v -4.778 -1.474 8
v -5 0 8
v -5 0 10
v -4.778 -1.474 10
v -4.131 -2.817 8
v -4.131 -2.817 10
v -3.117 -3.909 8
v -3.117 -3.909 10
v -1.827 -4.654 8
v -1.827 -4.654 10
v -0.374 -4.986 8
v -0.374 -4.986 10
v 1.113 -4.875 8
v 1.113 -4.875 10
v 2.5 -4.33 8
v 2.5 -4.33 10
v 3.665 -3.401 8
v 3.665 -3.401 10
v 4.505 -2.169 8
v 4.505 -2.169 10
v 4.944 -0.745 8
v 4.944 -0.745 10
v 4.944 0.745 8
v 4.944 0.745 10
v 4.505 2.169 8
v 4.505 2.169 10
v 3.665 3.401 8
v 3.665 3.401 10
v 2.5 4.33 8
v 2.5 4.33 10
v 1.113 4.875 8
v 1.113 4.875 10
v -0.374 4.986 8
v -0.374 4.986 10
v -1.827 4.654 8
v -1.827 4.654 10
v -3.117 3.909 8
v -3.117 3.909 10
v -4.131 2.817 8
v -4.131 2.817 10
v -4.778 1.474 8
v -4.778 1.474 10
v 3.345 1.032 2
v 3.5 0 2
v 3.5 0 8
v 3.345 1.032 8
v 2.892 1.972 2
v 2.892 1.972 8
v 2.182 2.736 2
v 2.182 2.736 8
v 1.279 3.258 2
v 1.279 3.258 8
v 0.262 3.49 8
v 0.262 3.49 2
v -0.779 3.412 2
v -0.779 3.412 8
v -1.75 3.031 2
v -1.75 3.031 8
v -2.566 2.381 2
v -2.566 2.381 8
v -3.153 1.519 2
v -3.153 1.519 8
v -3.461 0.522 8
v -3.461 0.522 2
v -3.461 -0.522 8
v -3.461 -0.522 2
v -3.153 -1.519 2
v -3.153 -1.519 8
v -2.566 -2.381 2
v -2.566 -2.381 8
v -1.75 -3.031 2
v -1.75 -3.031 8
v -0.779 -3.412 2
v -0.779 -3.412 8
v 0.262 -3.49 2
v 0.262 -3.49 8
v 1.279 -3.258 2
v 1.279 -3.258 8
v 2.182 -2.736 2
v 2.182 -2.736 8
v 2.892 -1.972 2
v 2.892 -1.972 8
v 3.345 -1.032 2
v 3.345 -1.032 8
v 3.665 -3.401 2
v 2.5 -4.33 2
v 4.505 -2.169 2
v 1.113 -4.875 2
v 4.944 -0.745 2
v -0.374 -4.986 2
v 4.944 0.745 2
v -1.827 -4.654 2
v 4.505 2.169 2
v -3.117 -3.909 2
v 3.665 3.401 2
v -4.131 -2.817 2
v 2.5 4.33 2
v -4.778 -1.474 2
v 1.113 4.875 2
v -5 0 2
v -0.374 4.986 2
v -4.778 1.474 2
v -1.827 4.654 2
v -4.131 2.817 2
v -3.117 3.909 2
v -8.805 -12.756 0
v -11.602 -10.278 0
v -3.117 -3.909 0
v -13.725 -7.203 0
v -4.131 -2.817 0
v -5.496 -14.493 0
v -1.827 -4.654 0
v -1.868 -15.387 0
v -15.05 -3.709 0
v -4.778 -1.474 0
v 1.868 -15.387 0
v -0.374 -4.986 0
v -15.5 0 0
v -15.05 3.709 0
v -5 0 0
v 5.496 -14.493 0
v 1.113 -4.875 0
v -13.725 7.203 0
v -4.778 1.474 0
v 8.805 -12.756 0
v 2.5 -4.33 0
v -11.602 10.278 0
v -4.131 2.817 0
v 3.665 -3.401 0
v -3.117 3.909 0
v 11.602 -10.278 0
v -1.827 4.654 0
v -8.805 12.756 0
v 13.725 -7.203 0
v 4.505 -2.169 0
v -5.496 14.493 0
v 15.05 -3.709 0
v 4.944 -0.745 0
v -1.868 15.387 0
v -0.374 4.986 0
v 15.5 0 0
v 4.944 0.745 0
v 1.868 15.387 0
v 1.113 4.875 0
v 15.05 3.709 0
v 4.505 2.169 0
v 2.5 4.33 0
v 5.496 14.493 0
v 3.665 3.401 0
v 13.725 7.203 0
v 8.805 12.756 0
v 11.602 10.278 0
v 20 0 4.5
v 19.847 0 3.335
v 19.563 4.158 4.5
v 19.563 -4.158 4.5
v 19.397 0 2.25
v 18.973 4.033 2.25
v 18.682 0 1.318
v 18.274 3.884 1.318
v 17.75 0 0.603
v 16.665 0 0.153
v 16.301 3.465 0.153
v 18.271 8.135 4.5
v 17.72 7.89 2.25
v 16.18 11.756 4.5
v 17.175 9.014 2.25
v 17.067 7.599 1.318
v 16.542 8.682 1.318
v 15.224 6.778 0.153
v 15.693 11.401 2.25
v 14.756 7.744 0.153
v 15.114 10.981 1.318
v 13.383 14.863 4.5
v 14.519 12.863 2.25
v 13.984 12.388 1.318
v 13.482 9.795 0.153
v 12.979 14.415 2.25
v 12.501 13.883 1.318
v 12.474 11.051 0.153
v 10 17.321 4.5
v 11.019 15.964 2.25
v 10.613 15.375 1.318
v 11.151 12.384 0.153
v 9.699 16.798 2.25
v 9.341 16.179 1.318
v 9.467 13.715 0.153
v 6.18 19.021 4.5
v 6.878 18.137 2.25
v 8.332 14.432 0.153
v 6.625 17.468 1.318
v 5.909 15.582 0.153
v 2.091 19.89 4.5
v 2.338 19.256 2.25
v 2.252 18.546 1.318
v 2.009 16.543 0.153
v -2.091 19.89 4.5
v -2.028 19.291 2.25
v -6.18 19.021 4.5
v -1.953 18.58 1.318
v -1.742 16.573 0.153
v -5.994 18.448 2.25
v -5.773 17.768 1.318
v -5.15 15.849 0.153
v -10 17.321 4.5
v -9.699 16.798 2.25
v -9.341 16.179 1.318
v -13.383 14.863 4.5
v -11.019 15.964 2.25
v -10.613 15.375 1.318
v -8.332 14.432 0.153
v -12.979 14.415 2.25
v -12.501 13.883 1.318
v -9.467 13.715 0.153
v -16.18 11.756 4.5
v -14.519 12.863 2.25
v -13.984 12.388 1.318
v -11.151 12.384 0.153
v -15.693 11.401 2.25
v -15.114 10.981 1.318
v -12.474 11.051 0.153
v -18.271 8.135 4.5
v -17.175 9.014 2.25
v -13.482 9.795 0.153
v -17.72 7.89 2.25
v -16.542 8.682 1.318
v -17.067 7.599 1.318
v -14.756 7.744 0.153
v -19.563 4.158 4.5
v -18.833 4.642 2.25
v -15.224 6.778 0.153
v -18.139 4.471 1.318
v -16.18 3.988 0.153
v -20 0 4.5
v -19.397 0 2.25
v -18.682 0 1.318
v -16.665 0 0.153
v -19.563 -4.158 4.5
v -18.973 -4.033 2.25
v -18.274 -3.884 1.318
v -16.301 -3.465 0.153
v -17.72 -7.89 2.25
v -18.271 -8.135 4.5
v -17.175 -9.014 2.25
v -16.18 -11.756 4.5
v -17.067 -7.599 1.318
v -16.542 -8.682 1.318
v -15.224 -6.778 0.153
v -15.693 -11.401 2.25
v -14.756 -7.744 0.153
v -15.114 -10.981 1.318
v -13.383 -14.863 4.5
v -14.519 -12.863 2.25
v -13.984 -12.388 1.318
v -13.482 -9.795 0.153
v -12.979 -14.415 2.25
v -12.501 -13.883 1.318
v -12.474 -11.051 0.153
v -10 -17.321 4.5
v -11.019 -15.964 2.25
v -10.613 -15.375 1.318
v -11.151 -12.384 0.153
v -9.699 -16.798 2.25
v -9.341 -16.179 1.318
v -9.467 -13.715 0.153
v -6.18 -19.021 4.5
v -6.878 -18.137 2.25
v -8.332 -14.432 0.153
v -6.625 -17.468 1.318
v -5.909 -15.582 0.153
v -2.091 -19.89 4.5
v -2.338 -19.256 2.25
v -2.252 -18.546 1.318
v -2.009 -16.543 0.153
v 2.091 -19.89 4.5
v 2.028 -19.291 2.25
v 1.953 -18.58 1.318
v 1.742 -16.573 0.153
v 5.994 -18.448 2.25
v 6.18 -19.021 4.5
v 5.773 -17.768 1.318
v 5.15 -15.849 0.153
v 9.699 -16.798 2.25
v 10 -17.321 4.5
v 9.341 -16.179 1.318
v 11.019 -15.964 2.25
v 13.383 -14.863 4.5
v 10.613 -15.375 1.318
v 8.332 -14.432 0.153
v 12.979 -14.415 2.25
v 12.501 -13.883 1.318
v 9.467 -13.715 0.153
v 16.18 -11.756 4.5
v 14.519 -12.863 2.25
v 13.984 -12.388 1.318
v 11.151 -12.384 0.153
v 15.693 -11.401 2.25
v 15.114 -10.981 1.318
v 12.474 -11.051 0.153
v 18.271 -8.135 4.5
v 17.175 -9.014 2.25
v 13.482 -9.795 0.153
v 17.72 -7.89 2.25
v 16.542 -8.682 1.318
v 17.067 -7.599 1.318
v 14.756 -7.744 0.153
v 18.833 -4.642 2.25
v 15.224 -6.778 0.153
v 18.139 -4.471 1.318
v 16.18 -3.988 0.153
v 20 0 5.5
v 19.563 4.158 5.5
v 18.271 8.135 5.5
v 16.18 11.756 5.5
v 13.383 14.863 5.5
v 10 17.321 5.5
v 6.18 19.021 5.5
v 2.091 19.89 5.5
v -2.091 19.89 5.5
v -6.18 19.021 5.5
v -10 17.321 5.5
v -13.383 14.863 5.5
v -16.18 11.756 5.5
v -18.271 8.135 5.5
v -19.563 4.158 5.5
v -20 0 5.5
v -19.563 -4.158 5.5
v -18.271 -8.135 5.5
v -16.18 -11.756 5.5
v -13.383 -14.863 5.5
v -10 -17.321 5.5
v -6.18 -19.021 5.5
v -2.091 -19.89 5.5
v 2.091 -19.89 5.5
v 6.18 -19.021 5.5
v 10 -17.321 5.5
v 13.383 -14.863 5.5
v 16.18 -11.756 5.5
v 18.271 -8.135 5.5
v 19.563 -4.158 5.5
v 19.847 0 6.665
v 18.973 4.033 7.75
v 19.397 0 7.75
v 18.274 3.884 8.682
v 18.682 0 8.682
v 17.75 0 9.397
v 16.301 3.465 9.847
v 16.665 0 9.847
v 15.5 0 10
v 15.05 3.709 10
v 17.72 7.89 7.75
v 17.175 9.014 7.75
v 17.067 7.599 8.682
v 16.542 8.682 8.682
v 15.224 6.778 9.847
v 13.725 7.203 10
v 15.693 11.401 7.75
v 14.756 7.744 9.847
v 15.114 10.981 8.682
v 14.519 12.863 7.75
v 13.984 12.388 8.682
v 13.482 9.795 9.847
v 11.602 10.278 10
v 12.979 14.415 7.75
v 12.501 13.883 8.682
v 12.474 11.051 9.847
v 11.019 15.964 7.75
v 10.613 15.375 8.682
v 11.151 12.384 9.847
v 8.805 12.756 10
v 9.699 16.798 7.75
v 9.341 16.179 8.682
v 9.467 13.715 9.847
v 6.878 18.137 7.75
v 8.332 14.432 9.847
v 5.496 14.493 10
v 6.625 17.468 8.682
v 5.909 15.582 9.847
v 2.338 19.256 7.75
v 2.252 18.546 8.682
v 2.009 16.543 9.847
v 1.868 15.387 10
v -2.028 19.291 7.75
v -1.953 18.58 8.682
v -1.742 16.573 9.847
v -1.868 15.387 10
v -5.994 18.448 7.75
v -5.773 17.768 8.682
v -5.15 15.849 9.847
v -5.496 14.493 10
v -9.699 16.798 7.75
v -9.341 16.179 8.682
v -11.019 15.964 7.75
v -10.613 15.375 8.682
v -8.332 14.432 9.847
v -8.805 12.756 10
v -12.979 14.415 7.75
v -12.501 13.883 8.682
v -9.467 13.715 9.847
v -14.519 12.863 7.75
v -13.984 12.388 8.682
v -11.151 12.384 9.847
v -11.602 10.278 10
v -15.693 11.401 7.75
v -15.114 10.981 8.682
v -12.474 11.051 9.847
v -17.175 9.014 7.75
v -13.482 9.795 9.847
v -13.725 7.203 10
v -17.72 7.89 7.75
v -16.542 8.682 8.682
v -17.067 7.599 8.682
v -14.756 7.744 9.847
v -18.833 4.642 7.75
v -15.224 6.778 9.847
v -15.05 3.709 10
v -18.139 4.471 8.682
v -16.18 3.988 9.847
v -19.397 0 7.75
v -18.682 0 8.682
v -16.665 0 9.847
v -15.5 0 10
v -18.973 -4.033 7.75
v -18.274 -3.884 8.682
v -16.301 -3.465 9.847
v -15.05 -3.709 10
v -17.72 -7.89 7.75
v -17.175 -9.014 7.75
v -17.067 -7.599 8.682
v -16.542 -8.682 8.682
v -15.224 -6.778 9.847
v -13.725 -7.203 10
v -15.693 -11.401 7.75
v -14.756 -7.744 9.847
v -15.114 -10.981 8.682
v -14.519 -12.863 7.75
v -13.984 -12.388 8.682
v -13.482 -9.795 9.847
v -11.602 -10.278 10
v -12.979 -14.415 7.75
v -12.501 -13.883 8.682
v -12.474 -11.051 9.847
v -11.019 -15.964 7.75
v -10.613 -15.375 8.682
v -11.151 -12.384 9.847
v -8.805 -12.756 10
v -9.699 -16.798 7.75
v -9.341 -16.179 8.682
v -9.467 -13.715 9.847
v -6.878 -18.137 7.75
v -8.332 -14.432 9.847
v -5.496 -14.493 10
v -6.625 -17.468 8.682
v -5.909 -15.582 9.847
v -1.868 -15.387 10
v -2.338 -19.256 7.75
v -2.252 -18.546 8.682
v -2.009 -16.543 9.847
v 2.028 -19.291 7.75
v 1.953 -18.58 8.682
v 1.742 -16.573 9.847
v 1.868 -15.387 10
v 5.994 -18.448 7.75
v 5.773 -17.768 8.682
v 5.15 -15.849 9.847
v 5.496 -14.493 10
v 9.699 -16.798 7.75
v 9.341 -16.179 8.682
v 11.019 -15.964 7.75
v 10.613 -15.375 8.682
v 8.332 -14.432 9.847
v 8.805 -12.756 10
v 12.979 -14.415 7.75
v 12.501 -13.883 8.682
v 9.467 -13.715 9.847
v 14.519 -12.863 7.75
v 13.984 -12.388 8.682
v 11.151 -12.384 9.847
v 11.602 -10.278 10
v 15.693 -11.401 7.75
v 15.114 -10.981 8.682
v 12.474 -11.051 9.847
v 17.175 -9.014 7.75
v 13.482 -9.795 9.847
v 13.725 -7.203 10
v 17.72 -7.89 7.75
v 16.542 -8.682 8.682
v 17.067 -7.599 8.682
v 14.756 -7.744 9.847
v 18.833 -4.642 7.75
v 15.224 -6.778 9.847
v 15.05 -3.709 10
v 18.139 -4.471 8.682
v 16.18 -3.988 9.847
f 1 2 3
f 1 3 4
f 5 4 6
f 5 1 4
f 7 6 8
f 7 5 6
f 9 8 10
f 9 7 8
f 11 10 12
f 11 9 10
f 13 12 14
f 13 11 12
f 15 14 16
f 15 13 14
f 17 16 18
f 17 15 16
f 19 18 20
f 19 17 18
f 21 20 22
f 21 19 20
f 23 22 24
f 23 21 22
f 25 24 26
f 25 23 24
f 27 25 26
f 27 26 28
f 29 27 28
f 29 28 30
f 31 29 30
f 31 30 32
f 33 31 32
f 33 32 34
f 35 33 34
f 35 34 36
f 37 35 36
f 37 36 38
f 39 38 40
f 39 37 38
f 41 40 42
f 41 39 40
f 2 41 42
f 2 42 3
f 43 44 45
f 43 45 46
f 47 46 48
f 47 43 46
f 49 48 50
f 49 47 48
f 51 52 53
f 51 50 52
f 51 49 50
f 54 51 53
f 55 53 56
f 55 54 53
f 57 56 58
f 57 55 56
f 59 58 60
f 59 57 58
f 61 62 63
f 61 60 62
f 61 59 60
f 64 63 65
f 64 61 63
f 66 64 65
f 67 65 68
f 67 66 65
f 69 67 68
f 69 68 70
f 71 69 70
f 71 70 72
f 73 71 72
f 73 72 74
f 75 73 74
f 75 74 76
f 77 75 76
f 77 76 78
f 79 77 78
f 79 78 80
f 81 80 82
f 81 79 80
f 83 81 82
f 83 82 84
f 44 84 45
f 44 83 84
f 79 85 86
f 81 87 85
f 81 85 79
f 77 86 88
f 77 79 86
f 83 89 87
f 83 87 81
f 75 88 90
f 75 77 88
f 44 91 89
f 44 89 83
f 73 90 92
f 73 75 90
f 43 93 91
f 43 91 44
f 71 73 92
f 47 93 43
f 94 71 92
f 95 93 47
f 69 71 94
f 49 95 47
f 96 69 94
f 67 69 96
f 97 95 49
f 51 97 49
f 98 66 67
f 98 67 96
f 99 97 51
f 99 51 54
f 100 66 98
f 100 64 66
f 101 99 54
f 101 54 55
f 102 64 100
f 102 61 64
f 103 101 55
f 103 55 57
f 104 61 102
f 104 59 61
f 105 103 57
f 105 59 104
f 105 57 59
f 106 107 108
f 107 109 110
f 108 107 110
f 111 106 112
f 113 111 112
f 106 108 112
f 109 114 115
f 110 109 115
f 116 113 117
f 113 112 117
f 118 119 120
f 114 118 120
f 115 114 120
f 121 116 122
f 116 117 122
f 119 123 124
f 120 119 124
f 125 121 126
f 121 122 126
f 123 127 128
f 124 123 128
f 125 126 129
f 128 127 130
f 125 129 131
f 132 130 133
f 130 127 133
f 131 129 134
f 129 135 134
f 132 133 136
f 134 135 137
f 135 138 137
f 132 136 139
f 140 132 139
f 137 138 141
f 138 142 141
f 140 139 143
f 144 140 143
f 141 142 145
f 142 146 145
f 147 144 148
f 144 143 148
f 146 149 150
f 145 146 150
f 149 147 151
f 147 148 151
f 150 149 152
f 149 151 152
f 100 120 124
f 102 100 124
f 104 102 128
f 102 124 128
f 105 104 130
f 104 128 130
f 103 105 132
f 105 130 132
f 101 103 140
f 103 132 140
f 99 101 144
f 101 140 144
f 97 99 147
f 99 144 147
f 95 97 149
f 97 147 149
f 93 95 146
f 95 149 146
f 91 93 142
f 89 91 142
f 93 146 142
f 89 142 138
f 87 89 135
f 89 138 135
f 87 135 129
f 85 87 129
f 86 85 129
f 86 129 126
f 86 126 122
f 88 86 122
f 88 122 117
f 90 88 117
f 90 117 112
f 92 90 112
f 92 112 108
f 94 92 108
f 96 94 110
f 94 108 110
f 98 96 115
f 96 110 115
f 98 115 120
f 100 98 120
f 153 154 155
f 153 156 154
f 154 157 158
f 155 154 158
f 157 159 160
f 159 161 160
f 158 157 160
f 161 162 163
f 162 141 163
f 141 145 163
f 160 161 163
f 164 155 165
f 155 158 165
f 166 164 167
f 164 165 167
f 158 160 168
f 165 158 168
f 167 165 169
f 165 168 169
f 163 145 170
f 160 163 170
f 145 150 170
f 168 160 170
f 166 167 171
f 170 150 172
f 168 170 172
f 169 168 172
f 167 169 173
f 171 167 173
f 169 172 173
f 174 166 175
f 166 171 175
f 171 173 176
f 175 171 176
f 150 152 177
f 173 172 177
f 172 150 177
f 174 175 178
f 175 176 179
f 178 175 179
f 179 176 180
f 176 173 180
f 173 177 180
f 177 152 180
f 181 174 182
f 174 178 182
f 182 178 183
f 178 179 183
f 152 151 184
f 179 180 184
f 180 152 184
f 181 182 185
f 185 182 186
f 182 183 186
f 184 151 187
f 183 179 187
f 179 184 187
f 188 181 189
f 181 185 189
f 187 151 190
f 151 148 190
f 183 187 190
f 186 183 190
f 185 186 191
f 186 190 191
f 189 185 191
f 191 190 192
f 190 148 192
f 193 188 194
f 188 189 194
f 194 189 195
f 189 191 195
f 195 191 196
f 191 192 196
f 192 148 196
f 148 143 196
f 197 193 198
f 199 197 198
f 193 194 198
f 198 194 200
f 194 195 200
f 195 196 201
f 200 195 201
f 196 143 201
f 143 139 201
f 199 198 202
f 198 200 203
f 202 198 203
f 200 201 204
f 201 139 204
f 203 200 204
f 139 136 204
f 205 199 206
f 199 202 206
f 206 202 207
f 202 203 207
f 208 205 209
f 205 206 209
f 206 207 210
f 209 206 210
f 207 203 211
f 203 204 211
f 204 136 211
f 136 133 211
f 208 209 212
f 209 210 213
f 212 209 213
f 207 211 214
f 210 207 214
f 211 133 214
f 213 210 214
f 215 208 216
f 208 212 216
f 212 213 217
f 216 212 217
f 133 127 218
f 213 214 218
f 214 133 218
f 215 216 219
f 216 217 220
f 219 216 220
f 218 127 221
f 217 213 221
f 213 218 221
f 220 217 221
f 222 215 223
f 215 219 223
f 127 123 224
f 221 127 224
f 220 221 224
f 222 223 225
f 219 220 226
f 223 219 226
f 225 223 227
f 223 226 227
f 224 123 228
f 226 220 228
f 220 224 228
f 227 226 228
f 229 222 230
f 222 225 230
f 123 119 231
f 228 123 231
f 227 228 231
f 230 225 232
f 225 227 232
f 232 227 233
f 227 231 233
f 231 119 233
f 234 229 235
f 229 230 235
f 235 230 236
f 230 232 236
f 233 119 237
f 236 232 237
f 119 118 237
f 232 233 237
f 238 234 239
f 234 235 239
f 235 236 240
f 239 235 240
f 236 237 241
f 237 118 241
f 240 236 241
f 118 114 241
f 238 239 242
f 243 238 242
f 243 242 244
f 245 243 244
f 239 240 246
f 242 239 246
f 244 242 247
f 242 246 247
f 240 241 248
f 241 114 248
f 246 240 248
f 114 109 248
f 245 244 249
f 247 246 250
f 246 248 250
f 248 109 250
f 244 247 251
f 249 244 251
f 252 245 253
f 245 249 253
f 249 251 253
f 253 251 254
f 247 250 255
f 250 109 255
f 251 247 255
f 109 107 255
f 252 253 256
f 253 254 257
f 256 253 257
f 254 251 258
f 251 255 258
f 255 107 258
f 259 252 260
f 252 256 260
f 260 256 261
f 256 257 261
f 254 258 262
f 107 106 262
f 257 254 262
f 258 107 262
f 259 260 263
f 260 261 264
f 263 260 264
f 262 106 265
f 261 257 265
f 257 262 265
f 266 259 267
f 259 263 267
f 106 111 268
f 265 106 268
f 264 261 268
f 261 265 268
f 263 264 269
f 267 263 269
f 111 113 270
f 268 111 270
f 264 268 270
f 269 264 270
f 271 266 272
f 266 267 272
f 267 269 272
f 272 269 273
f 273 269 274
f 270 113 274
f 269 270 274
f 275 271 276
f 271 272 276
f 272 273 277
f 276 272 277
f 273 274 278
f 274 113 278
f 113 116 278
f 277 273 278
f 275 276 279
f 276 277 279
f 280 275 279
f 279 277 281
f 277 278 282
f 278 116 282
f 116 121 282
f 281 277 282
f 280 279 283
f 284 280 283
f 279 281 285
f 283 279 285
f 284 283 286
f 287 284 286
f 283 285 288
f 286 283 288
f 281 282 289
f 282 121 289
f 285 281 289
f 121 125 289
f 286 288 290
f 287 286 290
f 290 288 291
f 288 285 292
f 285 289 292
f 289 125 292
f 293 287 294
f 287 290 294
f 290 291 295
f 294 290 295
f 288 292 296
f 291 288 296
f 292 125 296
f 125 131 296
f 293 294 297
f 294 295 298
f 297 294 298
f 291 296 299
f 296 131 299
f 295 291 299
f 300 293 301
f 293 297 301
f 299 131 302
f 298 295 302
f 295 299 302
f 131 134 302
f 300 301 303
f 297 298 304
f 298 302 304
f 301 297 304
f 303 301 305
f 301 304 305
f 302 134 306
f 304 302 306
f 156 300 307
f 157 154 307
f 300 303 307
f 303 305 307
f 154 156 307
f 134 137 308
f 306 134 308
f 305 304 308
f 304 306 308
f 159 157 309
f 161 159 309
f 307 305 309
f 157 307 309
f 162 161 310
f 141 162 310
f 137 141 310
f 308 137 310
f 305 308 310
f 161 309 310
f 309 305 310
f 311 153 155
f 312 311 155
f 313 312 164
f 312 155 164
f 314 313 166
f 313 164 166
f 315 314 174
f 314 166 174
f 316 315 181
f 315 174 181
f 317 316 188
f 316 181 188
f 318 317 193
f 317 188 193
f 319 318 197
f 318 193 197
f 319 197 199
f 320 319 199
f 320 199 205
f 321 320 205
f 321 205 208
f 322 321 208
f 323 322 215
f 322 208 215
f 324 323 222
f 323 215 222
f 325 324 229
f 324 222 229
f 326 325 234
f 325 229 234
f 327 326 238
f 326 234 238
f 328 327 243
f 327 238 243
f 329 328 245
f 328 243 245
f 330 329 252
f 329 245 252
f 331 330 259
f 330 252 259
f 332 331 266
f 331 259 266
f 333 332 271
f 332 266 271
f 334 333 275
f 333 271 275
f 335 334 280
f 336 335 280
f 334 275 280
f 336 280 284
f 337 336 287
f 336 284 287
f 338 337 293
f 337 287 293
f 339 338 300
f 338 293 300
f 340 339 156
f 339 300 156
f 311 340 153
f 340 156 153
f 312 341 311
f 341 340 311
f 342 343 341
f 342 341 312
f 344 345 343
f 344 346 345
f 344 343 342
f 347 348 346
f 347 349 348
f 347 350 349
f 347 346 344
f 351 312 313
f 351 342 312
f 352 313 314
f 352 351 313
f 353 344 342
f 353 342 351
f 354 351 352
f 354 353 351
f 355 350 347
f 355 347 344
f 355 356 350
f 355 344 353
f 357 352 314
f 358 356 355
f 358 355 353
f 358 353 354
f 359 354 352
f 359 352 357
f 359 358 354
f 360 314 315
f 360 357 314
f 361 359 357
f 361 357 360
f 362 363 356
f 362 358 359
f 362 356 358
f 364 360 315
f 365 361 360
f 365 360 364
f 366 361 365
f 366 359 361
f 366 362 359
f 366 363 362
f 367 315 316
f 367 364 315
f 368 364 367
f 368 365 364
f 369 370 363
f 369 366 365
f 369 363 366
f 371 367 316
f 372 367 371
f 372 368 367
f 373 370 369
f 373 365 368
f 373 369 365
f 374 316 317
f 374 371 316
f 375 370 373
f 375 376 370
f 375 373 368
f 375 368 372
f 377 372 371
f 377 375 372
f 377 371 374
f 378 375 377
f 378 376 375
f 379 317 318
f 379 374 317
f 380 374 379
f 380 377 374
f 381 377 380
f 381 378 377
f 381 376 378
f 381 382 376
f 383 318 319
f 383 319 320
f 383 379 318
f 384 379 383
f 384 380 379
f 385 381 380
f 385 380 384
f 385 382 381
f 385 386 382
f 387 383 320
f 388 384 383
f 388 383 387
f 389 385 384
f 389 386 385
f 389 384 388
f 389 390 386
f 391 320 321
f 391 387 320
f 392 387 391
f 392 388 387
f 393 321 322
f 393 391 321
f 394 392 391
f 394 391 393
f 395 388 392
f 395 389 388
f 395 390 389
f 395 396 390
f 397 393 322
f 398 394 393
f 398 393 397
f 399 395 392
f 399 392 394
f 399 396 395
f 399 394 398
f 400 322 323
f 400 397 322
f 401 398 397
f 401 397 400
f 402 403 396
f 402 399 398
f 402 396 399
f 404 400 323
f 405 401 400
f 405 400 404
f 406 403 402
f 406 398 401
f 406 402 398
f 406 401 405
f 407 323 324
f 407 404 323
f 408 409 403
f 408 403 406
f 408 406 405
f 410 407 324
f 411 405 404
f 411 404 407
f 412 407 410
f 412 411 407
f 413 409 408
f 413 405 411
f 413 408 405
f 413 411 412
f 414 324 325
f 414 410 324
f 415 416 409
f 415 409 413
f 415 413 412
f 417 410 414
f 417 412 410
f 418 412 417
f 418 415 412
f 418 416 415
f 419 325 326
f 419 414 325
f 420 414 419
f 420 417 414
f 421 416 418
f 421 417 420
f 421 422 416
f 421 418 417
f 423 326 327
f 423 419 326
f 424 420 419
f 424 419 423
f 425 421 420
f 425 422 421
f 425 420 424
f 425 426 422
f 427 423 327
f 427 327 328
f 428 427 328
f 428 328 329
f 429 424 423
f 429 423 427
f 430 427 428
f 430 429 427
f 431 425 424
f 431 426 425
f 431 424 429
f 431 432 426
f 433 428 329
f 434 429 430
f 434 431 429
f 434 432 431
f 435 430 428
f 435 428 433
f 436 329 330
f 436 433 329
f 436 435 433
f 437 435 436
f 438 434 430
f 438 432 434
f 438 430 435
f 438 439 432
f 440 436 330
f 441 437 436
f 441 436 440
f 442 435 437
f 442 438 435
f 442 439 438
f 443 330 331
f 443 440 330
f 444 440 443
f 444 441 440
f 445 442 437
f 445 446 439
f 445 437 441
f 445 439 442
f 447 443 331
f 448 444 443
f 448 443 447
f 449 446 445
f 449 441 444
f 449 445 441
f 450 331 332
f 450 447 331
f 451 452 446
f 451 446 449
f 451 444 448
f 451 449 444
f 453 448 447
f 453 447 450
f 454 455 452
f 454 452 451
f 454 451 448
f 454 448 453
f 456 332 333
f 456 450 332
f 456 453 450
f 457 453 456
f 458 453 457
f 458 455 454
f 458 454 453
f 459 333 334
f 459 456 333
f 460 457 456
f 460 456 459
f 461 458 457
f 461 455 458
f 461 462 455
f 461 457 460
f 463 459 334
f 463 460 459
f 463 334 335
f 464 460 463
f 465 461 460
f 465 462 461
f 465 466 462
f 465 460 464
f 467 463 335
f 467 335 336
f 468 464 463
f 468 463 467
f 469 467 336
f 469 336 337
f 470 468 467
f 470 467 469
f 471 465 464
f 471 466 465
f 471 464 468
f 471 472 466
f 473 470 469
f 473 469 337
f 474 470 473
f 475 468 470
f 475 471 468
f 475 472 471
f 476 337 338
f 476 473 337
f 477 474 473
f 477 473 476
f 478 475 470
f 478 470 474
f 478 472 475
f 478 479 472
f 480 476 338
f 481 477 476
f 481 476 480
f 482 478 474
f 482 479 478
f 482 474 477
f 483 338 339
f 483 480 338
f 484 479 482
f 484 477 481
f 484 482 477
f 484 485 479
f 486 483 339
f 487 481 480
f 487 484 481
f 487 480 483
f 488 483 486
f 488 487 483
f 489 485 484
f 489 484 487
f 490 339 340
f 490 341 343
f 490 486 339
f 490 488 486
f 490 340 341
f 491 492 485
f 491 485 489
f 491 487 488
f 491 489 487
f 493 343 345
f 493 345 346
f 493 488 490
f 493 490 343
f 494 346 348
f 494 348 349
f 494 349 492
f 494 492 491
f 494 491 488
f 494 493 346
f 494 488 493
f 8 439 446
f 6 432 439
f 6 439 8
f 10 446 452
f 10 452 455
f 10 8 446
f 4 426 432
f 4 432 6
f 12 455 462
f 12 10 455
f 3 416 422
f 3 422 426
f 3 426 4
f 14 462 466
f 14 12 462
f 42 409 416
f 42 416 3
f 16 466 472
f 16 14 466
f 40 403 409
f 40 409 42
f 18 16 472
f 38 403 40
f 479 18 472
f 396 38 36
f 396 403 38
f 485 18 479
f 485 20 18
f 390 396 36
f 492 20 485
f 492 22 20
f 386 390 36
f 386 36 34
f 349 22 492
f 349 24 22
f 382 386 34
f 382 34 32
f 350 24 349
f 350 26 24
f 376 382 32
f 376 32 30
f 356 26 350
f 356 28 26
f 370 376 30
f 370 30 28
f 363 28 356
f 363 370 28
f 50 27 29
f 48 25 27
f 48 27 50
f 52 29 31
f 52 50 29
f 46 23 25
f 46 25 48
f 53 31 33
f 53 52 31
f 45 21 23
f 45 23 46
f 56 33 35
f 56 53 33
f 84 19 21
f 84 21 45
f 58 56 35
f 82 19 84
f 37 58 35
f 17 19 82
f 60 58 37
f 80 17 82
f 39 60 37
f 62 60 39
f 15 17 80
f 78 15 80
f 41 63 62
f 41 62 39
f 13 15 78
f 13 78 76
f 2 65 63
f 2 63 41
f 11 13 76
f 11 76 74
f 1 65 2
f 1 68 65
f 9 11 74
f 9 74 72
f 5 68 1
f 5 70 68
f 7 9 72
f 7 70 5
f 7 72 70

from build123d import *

# Parameters (mm, degrees)
SKETCH1_R           = 20
SKETCH1_R_2         = 3.5
BOSS_EXTRUDE1_DEPTH = 10
FILLET1_R           = 4.5
SKETCH2_R           = 5
CUT_EXTRUDE1_DEPTH  = 2
CUT_EXTRUDE2_START  = -2
SKETCH5_R           = 5
CUT_EXTRUDE2_DEPTH  = 2


with BuildPart() as part:
    # Sketch1 → Boss-Extrude1 (new body)
    with BuildSketch(Plane.XY):
        Circle(SKETCH1_R)
        Circle(SKETCH1_R_2, mode=Mode.SUBTRACT)
    extrude(amount=BOSS_EXTRUDE1_DEPTH)

    # Fillet1
    fillet1_edges = [part.edges().sort_by_distance(p)[0] for p in [
        (-20, 0, 0),
        (-20, 0, 10),
    ]]
    fillet(fillet1_edges, radius=FILLET1_R)

    # Sketch2 → Cut-Extrude1 (cut)
    with BuildSketch(Plane(origin=(0, 0, 0), x_dir=(-1, 0, 0), z_dir=(0, 0, -1))):
        Circle(SKETCH2_R)
    extrude(amount=-CUT_EXTRUDE1_DEPTH, mode=Mode.SUBTRACT)

    # Sketch5 → Cut-Extrude2 (cut)
    with BuildSketch(Plane.XY.offset(10).offset(CUT_EXTRUDE2_START)):
        with Locations(Location((0, 0, 0), (0, 0, 180))):
            Circle(SKETCH5_R)
    extrude(amount=CUT_EXTRUDE2_DEPTH, mode=Mode.SUBTRACT)


solid = part.part
